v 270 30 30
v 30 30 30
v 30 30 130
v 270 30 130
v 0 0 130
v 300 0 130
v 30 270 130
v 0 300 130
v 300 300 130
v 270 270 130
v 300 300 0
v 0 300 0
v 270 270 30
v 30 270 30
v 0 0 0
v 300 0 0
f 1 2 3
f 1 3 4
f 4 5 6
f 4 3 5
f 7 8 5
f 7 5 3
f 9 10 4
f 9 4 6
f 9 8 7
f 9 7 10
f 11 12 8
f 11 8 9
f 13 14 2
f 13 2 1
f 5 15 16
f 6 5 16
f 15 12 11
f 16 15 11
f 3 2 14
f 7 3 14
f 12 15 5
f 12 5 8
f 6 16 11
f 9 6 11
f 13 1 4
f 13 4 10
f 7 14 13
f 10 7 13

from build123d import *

# Parameters (mm, degrees)
SKETCH_W      = 300
SKETCH_H      = 300
PAD_DEPTH     = 30
SKETCH001_W   = 300
SKETCH001_H   = 300
SKETCH001_W_2 = 240
SKETCH001_H_2 = 240
PAD001_DEPTH  = 100


with BuildPart() as body:
    # Sketch → Pad (new body)
    with BuildSketch(Plane.XY):
        with Locations((150, 150)):
            Rectangle(SKETCH_W, SKETCH_H)
    extrude(amount=PAD_DEPTH)


with BuildPart() as body001:
    # Sketch001 (on Face6 of Pad) → Pad001 (new body)
    with BuildSketch(Plane.XY.offset(30)):
        with Locations((150, 150)):
            Rectangle(SKETCH001_W, SKETCH001_H)
        with Locations((150, 150)):
            Rectangle(SKETCH001_W_2, SKETCH001_H_2, mode=Mode.SUBTRACT)
    extrude(amount=PAD001_DEPTH)

    # Boolean: union Body
    add(body.part)


solid = body001.part
